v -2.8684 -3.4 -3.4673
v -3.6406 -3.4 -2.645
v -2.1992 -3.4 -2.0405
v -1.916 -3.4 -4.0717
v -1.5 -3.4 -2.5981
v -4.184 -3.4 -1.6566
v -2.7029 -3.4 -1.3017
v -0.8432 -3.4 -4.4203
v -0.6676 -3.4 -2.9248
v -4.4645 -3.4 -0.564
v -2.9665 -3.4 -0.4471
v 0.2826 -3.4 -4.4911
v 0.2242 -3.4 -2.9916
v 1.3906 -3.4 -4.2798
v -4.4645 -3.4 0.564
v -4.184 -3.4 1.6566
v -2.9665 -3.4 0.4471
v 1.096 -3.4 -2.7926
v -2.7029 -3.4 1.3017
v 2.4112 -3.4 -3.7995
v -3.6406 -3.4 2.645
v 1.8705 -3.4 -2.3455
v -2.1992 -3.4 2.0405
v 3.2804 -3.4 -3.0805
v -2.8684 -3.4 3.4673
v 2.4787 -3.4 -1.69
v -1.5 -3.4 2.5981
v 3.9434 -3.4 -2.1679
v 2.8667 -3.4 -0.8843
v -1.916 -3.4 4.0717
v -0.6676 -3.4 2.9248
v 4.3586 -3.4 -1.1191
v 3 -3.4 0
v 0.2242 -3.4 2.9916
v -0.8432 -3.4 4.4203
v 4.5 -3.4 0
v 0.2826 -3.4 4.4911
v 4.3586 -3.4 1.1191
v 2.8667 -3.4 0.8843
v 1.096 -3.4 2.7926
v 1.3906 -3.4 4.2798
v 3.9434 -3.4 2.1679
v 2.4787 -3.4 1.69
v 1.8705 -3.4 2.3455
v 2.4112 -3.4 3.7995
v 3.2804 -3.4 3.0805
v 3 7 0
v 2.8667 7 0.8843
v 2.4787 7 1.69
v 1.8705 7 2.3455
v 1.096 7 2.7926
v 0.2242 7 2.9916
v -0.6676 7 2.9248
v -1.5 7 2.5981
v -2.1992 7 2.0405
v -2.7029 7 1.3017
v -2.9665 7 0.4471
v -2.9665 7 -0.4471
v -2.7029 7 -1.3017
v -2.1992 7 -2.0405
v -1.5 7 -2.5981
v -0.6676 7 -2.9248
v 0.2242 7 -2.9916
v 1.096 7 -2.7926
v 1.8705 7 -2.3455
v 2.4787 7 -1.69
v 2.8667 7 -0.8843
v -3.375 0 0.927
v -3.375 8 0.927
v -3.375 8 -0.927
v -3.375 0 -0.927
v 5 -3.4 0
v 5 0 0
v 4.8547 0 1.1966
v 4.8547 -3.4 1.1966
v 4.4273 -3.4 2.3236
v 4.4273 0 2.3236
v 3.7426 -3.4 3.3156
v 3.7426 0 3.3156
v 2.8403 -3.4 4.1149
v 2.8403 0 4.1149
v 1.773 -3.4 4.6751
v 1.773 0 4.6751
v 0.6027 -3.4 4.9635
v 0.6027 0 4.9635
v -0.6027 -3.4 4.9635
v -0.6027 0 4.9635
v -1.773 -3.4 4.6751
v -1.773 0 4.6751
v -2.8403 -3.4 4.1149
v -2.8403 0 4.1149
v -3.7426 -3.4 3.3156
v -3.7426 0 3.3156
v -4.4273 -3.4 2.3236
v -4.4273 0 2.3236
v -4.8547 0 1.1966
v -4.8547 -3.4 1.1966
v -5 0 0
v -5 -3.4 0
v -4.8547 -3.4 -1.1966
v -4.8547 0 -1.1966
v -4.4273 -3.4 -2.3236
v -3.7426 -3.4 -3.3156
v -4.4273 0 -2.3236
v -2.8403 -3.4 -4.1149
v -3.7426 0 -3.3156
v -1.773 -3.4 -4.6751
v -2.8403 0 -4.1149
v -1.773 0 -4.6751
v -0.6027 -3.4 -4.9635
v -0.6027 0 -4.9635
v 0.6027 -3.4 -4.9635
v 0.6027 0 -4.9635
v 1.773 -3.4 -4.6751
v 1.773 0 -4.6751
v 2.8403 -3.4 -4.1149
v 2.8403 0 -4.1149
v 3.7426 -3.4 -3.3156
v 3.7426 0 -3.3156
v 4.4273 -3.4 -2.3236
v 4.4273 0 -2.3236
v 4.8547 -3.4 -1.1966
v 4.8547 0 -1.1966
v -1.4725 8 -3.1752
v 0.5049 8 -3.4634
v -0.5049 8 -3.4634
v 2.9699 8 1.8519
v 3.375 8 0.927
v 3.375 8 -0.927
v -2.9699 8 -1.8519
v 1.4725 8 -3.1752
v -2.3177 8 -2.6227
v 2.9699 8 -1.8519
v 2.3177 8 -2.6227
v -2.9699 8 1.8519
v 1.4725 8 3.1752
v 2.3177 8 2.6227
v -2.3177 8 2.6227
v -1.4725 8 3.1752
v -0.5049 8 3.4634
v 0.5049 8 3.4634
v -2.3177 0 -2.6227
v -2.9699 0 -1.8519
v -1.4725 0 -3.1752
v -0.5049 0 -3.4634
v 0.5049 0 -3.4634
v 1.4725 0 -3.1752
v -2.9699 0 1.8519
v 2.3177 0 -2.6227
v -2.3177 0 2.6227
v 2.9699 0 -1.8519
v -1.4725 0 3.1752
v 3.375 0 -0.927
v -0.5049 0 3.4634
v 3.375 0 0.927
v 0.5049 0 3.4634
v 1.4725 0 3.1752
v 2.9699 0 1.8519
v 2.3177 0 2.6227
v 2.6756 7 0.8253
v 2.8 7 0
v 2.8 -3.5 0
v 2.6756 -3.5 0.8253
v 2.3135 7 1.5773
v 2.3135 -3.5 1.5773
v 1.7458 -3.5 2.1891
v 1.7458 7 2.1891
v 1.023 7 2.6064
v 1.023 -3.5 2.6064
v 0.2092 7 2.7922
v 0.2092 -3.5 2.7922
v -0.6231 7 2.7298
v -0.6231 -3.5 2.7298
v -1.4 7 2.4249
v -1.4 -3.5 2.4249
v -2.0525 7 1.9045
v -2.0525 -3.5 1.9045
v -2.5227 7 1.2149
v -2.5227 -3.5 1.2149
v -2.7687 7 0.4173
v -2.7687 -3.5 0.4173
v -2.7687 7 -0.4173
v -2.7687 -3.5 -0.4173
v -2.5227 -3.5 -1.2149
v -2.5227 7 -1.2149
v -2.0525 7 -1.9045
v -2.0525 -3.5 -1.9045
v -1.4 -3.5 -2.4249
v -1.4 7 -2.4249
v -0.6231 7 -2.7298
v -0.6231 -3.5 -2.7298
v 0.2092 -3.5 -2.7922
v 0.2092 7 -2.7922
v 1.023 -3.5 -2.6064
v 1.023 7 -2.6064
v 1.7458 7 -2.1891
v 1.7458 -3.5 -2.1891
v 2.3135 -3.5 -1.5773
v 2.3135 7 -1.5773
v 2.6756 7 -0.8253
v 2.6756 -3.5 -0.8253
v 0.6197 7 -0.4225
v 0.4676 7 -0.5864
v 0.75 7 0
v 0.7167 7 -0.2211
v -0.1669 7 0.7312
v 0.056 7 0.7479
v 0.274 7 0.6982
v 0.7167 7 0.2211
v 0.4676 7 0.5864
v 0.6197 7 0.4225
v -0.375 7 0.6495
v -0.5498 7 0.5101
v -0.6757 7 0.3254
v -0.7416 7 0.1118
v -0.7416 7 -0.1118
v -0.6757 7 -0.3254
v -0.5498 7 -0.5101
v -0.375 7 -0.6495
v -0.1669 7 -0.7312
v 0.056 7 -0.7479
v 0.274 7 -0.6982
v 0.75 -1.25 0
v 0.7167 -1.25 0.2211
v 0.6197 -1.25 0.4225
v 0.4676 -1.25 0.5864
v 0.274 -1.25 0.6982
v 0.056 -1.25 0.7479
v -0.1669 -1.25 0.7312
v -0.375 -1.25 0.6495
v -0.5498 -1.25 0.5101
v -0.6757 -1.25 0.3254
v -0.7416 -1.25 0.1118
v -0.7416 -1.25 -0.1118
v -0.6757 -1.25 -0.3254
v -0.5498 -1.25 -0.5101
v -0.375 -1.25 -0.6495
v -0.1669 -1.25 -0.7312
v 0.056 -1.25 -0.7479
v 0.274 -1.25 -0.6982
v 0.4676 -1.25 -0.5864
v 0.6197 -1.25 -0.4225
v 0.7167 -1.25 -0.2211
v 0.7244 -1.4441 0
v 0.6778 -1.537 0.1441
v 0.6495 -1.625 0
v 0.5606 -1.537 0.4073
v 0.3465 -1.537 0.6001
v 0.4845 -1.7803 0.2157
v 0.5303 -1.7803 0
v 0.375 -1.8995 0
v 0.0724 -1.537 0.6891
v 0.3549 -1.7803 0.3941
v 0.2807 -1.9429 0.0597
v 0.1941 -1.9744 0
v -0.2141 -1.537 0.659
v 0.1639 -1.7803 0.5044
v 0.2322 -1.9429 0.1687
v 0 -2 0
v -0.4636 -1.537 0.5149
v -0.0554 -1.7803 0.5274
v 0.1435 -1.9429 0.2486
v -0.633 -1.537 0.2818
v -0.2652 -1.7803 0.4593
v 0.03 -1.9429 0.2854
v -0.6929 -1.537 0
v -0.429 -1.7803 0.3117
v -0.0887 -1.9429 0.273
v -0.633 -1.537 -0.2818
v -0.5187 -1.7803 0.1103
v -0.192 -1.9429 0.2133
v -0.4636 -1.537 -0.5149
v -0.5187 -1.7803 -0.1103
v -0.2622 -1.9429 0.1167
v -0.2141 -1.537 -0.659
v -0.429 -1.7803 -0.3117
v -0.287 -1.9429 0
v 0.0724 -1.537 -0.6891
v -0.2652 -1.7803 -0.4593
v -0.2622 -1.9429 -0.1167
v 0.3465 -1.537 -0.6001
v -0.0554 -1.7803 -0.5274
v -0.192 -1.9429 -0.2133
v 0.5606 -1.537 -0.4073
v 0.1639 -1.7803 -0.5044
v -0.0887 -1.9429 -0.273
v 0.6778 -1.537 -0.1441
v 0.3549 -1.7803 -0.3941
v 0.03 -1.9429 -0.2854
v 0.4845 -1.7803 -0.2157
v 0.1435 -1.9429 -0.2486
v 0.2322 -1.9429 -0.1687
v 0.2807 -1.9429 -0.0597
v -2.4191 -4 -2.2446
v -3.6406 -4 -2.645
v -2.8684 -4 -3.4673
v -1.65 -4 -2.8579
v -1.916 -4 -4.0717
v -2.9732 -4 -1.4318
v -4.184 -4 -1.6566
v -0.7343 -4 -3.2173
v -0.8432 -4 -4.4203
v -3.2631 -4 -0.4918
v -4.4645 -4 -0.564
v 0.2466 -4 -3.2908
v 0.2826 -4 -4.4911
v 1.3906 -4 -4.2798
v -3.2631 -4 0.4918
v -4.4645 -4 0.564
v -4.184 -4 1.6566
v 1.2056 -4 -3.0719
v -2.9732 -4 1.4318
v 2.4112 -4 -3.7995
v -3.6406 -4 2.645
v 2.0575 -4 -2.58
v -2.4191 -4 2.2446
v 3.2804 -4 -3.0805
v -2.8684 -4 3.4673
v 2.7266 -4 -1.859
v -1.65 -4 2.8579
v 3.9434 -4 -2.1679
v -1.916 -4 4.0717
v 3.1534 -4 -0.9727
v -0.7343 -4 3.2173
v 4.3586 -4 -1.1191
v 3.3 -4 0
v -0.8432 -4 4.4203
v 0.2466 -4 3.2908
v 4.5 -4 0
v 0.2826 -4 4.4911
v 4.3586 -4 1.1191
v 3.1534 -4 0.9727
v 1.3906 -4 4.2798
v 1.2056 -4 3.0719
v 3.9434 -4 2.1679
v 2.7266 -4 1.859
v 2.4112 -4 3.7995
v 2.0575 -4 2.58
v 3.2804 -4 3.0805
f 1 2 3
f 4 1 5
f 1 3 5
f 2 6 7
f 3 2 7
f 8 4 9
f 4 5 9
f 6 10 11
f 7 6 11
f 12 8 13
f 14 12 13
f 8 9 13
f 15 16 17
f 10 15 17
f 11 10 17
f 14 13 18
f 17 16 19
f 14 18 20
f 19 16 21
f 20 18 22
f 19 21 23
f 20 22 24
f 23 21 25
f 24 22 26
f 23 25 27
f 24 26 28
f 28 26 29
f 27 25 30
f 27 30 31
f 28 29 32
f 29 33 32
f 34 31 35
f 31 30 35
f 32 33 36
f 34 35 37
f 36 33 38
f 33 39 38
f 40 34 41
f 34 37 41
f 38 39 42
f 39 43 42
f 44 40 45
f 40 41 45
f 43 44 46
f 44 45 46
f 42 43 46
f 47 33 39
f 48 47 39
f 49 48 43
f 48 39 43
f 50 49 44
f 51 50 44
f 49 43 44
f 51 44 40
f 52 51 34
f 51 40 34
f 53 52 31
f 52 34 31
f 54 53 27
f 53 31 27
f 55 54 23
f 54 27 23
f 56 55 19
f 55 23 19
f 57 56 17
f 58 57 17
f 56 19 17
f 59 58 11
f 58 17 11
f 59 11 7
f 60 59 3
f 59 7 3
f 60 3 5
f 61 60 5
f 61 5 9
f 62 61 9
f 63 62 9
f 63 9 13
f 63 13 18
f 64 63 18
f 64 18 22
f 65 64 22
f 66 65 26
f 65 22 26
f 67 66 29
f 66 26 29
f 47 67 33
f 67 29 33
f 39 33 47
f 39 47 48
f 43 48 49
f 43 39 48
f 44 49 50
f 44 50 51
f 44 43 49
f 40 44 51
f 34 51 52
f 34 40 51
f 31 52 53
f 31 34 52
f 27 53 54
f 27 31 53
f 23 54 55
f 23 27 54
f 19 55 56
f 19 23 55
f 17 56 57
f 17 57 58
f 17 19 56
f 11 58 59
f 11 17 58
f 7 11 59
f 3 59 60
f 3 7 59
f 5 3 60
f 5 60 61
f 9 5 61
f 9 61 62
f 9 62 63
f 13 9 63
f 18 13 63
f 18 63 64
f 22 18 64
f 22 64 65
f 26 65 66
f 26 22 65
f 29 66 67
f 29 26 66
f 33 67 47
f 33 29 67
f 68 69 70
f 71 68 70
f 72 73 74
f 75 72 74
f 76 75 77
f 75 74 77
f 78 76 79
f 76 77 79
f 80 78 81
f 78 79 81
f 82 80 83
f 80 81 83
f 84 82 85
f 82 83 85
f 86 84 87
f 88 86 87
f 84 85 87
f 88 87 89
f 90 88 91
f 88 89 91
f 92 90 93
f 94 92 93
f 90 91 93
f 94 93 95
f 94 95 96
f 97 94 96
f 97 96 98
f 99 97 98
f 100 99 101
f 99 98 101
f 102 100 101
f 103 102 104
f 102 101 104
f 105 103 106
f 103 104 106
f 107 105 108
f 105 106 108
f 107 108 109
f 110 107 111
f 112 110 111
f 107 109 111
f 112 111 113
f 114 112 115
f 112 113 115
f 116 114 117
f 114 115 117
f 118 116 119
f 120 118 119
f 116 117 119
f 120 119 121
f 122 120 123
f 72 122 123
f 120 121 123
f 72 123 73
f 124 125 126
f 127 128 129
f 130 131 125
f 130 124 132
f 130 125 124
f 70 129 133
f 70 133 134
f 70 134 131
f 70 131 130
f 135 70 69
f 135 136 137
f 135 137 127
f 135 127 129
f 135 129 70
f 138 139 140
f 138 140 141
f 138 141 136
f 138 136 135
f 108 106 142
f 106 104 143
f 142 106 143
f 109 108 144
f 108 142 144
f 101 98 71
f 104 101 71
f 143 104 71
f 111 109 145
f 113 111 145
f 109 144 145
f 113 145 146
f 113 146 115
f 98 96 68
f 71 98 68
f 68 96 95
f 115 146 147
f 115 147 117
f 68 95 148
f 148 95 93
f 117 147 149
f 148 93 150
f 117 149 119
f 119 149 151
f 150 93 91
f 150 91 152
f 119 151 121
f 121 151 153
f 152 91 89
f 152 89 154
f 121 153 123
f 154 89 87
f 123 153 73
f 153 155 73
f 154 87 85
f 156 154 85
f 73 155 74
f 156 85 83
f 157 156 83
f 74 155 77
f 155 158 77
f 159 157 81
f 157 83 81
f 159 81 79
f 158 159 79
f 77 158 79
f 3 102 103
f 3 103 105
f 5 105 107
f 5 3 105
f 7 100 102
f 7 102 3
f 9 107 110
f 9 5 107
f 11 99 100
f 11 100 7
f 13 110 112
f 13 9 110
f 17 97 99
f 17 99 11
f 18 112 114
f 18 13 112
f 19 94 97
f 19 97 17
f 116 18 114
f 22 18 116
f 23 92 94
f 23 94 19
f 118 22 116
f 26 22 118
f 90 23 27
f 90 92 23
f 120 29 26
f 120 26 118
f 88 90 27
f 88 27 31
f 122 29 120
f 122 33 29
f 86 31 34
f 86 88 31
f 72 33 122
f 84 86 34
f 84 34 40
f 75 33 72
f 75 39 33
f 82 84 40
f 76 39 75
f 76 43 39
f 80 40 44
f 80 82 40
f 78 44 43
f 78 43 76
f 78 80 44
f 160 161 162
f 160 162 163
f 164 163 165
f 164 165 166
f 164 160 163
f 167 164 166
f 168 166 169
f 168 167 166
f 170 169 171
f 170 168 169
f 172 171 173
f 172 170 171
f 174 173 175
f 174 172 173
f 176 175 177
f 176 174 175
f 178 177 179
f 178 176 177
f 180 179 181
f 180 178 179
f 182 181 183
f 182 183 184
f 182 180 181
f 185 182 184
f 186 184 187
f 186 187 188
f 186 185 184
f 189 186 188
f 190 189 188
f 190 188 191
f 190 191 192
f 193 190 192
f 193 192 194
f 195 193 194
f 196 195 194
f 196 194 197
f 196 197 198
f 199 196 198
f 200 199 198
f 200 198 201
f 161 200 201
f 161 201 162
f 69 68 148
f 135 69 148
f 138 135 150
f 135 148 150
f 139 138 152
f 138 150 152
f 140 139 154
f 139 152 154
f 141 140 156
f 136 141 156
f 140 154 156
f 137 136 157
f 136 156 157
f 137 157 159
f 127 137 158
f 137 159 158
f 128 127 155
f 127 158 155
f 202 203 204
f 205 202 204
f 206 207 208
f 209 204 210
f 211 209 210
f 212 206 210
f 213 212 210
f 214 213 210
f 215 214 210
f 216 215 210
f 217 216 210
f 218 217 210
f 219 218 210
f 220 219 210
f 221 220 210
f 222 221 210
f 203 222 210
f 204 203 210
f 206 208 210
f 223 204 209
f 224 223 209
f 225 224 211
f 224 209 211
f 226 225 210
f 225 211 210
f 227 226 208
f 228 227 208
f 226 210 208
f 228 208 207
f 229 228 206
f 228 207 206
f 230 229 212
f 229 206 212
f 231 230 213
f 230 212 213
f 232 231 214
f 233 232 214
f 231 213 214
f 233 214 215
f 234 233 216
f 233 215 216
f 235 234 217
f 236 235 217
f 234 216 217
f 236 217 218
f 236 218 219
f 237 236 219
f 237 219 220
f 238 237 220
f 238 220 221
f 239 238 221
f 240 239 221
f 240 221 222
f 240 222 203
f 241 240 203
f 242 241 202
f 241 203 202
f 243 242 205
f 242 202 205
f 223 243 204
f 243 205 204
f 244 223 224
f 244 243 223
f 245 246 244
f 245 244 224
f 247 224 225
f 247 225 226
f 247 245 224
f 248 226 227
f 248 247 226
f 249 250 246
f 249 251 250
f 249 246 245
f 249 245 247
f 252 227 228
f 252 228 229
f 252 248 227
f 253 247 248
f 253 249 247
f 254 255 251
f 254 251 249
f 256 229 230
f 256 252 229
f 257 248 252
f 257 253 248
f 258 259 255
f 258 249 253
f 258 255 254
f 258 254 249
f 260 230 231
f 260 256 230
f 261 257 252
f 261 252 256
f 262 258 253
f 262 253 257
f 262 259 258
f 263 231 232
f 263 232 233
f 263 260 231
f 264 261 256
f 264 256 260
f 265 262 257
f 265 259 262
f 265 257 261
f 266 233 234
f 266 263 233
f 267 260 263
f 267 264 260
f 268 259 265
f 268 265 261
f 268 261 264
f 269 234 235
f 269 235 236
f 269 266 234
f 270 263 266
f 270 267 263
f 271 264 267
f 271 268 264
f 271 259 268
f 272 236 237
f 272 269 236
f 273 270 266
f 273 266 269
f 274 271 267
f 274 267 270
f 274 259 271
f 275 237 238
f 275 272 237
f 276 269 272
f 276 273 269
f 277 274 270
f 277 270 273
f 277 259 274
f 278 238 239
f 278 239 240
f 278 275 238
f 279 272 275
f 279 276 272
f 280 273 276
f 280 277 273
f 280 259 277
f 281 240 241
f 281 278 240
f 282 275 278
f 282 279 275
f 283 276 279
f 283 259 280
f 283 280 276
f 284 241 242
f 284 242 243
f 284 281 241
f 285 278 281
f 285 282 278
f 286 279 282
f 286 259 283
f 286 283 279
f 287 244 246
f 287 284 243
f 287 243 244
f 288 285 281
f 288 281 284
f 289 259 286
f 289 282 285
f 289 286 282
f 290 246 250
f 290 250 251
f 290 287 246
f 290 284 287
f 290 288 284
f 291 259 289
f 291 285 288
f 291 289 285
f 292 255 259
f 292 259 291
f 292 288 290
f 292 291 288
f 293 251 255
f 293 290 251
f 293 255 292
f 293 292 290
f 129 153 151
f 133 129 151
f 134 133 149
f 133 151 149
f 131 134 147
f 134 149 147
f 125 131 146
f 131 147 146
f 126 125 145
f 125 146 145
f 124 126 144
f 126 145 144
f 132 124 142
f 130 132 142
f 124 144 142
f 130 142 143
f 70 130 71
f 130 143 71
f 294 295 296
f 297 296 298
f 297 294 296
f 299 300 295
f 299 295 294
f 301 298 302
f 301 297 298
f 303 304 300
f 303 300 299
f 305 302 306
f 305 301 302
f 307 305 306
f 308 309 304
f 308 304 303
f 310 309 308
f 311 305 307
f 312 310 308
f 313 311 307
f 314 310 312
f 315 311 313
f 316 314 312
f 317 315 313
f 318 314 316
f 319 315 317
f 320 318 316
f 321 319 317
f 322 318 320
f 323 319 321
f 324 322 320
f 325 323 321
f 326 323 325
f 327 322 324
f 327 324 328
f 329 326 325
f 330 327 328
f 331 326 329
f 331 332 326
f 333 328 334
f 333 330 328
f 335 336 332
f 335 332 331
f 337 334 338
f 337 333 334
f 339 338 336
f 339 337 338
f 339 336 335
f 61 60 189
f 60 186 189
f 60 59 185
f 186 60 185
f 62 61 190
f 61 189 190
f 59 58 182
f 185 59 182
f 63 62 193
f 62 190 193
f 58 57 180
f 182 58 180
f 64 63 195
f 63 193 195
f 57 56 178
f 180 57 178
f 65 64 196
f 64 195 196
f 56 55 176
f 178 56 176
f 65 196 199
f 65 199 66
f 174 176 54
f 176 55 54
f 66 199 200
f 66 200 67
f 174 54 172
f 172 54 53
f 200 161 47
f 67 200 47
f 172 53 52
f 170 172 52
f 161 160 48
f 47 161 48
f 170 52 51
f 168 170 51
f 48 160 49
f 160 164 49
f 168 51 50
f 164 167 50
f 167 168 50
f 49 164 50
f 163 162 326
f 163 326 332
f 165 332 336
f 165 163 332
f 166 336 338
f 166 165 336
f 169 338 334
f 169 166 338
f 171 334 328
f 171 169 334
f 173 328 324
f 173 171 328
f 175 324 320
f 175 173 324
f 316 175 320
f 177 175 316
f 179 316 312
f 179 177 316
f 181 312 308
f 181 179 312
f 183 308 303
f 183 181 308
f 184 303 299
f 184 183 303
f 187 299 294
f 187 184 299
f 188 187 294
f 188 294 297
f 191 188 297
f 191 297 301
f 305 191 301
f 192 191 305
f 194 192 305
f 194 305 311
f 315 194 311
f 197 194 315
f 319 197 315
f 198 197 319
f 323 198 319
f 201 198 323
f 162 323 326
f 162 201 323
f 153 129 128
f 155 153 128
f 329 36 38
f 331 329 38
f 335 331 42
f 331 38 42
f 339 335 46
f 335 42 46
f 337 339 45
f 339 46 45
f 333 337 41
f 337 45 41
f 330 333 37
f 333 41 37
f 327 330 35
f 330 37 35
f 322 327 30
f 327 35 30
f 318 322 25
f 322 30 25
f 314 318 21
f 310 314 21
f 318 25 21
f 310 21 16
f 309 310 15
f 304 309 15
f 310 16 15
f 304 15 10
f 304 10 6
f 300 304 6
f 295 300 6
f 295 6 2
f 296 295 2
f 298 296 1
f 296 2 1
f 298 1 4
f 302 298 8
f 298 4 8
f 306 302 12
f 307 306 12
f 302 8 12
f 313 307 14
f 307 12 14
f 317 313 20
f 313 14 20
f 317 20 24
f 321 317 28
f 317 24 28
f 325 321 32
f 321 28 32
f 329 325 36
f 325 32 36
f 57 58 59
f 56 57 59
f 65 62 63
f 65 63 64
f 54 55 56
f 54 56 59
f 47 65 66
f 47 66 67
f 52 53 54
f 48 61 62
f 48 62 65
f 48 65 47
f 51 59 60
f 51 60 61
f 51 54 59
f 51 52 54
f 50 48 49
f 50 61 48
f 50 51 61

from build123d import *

# Parameters (mm, degrees)
F0_R      = 5
F1_DEPTH  = 3.4
F2_R      = 3.5
F3_DEPTH  = 8
F5_DEPTH  = 8
F6_R      = 3
F7_DEPTH  = 10.4
F8_R      = 3
F8_R_2    = 2.8
F9_DEPTH  = 10.4
F10_R     = 4.5
F10_R_2   = 3
F10_R_3   = 2.8
F11_DEPTH = 0.6
F12_SIZE  = 0.5
F13_R     = 0.75
F14_DEPTH = 9
F15_R     = 0.75


with BuildPart() as f1:
    # F0 (on Front) → F1 (new body)
    with BuildSketch(Plane.XZ):
        Circle(F0_R)
    extrude(amount=F1_DEPTH)

    # F2 (on face) → F3 (join)
    with BuildSketch(Plane(origin=(0, 0, 0), x_dir=(-1, 0, 0), z_dir=(0, 1, 0))):
        Circle(F2_R)
    extrude(amount=F3_DEPTH)

    # F4 (on face) → F5 (cut, through all)
    with BuildSketch(Plane(origin=(0, 8, 0), x_dir=(-1, 0, 0), z_dir=(0, 1, 0))):
        with BuildLine():
            Line((3.375, 0.9270248109), (3.375, -0.9270248109))
            ThreePointArc((3.375, -0.9270248109), (3.4686092314, -0.4677071733), (3.5, 0))
            ThreePointArc((3.5, 0), (3.4686092314, 0.4677071733), (3.375, 0.9270248109))
        make_face()
        with BuildLine():
            ThreePointArc((-3.375, 0.9270248109), (-3.5, 0), (-3.375, -0.9270248109))
            Line((-3.375, -0.9270248109), (-3.375, 0.9270248109))
        make_face()
    extrude(amount=-F5_DEPTH, mode=Mode.SUBTRACT)

    # F6 (on face) → F7 (cut, through all)
    with BuildSketch(Plane.XZ.offset(3.4)):
        Circle(F6_R)
    extrude(amount=-F7_DEPTH, mode=Mode.SUBTRACT)


with BuildPart() as f9:
    # F8 (on face) → F9 (new body, through all)
    with BuildSketch(Plane.XZ.offset(3.4)):
        Circle(F8_R)
        Circle(F8_R_2, mode=Mode.SUBTRACT)
    extrude(amount=-F9_DEPTH)

    # F10 (on face) → F11 (join)
    with BuildSketch(Plane.XZ.offset(3.4)):
        Circle(F10_R)
        Circle(F10_R_2, mode=Mode.SUBTRACT)
        Circle(F10_R_2)
        Circle(F10_R_3, mode=Mode.SUBTRACT)
    extrude(amount=F11_DEPTH)

    # F12
    f12_edges = [f9.edges().sort_by_distance(p)[0] for p in [
        (-2.8, -4, 0),
    ]]
    chamfer(f12_edges, length=F12_SIZE)


with BuildPart() as f14:
    # F13 (on face) → F14 (new body)
    with BuildSketch(Plane.XZ.offset(-7)):
        Circle(F13_R)
    extrude(amount=F14_DEPTH)

    # F15
    f15_edges = [f14.edges().sort_by_distance(p)[0] for p in [
        (-0.75, -2, 0),
    ]]
    fillet(f15_edges, radius=F15_R)


solid = Compound([f1.part, f9.part, f14.part])
